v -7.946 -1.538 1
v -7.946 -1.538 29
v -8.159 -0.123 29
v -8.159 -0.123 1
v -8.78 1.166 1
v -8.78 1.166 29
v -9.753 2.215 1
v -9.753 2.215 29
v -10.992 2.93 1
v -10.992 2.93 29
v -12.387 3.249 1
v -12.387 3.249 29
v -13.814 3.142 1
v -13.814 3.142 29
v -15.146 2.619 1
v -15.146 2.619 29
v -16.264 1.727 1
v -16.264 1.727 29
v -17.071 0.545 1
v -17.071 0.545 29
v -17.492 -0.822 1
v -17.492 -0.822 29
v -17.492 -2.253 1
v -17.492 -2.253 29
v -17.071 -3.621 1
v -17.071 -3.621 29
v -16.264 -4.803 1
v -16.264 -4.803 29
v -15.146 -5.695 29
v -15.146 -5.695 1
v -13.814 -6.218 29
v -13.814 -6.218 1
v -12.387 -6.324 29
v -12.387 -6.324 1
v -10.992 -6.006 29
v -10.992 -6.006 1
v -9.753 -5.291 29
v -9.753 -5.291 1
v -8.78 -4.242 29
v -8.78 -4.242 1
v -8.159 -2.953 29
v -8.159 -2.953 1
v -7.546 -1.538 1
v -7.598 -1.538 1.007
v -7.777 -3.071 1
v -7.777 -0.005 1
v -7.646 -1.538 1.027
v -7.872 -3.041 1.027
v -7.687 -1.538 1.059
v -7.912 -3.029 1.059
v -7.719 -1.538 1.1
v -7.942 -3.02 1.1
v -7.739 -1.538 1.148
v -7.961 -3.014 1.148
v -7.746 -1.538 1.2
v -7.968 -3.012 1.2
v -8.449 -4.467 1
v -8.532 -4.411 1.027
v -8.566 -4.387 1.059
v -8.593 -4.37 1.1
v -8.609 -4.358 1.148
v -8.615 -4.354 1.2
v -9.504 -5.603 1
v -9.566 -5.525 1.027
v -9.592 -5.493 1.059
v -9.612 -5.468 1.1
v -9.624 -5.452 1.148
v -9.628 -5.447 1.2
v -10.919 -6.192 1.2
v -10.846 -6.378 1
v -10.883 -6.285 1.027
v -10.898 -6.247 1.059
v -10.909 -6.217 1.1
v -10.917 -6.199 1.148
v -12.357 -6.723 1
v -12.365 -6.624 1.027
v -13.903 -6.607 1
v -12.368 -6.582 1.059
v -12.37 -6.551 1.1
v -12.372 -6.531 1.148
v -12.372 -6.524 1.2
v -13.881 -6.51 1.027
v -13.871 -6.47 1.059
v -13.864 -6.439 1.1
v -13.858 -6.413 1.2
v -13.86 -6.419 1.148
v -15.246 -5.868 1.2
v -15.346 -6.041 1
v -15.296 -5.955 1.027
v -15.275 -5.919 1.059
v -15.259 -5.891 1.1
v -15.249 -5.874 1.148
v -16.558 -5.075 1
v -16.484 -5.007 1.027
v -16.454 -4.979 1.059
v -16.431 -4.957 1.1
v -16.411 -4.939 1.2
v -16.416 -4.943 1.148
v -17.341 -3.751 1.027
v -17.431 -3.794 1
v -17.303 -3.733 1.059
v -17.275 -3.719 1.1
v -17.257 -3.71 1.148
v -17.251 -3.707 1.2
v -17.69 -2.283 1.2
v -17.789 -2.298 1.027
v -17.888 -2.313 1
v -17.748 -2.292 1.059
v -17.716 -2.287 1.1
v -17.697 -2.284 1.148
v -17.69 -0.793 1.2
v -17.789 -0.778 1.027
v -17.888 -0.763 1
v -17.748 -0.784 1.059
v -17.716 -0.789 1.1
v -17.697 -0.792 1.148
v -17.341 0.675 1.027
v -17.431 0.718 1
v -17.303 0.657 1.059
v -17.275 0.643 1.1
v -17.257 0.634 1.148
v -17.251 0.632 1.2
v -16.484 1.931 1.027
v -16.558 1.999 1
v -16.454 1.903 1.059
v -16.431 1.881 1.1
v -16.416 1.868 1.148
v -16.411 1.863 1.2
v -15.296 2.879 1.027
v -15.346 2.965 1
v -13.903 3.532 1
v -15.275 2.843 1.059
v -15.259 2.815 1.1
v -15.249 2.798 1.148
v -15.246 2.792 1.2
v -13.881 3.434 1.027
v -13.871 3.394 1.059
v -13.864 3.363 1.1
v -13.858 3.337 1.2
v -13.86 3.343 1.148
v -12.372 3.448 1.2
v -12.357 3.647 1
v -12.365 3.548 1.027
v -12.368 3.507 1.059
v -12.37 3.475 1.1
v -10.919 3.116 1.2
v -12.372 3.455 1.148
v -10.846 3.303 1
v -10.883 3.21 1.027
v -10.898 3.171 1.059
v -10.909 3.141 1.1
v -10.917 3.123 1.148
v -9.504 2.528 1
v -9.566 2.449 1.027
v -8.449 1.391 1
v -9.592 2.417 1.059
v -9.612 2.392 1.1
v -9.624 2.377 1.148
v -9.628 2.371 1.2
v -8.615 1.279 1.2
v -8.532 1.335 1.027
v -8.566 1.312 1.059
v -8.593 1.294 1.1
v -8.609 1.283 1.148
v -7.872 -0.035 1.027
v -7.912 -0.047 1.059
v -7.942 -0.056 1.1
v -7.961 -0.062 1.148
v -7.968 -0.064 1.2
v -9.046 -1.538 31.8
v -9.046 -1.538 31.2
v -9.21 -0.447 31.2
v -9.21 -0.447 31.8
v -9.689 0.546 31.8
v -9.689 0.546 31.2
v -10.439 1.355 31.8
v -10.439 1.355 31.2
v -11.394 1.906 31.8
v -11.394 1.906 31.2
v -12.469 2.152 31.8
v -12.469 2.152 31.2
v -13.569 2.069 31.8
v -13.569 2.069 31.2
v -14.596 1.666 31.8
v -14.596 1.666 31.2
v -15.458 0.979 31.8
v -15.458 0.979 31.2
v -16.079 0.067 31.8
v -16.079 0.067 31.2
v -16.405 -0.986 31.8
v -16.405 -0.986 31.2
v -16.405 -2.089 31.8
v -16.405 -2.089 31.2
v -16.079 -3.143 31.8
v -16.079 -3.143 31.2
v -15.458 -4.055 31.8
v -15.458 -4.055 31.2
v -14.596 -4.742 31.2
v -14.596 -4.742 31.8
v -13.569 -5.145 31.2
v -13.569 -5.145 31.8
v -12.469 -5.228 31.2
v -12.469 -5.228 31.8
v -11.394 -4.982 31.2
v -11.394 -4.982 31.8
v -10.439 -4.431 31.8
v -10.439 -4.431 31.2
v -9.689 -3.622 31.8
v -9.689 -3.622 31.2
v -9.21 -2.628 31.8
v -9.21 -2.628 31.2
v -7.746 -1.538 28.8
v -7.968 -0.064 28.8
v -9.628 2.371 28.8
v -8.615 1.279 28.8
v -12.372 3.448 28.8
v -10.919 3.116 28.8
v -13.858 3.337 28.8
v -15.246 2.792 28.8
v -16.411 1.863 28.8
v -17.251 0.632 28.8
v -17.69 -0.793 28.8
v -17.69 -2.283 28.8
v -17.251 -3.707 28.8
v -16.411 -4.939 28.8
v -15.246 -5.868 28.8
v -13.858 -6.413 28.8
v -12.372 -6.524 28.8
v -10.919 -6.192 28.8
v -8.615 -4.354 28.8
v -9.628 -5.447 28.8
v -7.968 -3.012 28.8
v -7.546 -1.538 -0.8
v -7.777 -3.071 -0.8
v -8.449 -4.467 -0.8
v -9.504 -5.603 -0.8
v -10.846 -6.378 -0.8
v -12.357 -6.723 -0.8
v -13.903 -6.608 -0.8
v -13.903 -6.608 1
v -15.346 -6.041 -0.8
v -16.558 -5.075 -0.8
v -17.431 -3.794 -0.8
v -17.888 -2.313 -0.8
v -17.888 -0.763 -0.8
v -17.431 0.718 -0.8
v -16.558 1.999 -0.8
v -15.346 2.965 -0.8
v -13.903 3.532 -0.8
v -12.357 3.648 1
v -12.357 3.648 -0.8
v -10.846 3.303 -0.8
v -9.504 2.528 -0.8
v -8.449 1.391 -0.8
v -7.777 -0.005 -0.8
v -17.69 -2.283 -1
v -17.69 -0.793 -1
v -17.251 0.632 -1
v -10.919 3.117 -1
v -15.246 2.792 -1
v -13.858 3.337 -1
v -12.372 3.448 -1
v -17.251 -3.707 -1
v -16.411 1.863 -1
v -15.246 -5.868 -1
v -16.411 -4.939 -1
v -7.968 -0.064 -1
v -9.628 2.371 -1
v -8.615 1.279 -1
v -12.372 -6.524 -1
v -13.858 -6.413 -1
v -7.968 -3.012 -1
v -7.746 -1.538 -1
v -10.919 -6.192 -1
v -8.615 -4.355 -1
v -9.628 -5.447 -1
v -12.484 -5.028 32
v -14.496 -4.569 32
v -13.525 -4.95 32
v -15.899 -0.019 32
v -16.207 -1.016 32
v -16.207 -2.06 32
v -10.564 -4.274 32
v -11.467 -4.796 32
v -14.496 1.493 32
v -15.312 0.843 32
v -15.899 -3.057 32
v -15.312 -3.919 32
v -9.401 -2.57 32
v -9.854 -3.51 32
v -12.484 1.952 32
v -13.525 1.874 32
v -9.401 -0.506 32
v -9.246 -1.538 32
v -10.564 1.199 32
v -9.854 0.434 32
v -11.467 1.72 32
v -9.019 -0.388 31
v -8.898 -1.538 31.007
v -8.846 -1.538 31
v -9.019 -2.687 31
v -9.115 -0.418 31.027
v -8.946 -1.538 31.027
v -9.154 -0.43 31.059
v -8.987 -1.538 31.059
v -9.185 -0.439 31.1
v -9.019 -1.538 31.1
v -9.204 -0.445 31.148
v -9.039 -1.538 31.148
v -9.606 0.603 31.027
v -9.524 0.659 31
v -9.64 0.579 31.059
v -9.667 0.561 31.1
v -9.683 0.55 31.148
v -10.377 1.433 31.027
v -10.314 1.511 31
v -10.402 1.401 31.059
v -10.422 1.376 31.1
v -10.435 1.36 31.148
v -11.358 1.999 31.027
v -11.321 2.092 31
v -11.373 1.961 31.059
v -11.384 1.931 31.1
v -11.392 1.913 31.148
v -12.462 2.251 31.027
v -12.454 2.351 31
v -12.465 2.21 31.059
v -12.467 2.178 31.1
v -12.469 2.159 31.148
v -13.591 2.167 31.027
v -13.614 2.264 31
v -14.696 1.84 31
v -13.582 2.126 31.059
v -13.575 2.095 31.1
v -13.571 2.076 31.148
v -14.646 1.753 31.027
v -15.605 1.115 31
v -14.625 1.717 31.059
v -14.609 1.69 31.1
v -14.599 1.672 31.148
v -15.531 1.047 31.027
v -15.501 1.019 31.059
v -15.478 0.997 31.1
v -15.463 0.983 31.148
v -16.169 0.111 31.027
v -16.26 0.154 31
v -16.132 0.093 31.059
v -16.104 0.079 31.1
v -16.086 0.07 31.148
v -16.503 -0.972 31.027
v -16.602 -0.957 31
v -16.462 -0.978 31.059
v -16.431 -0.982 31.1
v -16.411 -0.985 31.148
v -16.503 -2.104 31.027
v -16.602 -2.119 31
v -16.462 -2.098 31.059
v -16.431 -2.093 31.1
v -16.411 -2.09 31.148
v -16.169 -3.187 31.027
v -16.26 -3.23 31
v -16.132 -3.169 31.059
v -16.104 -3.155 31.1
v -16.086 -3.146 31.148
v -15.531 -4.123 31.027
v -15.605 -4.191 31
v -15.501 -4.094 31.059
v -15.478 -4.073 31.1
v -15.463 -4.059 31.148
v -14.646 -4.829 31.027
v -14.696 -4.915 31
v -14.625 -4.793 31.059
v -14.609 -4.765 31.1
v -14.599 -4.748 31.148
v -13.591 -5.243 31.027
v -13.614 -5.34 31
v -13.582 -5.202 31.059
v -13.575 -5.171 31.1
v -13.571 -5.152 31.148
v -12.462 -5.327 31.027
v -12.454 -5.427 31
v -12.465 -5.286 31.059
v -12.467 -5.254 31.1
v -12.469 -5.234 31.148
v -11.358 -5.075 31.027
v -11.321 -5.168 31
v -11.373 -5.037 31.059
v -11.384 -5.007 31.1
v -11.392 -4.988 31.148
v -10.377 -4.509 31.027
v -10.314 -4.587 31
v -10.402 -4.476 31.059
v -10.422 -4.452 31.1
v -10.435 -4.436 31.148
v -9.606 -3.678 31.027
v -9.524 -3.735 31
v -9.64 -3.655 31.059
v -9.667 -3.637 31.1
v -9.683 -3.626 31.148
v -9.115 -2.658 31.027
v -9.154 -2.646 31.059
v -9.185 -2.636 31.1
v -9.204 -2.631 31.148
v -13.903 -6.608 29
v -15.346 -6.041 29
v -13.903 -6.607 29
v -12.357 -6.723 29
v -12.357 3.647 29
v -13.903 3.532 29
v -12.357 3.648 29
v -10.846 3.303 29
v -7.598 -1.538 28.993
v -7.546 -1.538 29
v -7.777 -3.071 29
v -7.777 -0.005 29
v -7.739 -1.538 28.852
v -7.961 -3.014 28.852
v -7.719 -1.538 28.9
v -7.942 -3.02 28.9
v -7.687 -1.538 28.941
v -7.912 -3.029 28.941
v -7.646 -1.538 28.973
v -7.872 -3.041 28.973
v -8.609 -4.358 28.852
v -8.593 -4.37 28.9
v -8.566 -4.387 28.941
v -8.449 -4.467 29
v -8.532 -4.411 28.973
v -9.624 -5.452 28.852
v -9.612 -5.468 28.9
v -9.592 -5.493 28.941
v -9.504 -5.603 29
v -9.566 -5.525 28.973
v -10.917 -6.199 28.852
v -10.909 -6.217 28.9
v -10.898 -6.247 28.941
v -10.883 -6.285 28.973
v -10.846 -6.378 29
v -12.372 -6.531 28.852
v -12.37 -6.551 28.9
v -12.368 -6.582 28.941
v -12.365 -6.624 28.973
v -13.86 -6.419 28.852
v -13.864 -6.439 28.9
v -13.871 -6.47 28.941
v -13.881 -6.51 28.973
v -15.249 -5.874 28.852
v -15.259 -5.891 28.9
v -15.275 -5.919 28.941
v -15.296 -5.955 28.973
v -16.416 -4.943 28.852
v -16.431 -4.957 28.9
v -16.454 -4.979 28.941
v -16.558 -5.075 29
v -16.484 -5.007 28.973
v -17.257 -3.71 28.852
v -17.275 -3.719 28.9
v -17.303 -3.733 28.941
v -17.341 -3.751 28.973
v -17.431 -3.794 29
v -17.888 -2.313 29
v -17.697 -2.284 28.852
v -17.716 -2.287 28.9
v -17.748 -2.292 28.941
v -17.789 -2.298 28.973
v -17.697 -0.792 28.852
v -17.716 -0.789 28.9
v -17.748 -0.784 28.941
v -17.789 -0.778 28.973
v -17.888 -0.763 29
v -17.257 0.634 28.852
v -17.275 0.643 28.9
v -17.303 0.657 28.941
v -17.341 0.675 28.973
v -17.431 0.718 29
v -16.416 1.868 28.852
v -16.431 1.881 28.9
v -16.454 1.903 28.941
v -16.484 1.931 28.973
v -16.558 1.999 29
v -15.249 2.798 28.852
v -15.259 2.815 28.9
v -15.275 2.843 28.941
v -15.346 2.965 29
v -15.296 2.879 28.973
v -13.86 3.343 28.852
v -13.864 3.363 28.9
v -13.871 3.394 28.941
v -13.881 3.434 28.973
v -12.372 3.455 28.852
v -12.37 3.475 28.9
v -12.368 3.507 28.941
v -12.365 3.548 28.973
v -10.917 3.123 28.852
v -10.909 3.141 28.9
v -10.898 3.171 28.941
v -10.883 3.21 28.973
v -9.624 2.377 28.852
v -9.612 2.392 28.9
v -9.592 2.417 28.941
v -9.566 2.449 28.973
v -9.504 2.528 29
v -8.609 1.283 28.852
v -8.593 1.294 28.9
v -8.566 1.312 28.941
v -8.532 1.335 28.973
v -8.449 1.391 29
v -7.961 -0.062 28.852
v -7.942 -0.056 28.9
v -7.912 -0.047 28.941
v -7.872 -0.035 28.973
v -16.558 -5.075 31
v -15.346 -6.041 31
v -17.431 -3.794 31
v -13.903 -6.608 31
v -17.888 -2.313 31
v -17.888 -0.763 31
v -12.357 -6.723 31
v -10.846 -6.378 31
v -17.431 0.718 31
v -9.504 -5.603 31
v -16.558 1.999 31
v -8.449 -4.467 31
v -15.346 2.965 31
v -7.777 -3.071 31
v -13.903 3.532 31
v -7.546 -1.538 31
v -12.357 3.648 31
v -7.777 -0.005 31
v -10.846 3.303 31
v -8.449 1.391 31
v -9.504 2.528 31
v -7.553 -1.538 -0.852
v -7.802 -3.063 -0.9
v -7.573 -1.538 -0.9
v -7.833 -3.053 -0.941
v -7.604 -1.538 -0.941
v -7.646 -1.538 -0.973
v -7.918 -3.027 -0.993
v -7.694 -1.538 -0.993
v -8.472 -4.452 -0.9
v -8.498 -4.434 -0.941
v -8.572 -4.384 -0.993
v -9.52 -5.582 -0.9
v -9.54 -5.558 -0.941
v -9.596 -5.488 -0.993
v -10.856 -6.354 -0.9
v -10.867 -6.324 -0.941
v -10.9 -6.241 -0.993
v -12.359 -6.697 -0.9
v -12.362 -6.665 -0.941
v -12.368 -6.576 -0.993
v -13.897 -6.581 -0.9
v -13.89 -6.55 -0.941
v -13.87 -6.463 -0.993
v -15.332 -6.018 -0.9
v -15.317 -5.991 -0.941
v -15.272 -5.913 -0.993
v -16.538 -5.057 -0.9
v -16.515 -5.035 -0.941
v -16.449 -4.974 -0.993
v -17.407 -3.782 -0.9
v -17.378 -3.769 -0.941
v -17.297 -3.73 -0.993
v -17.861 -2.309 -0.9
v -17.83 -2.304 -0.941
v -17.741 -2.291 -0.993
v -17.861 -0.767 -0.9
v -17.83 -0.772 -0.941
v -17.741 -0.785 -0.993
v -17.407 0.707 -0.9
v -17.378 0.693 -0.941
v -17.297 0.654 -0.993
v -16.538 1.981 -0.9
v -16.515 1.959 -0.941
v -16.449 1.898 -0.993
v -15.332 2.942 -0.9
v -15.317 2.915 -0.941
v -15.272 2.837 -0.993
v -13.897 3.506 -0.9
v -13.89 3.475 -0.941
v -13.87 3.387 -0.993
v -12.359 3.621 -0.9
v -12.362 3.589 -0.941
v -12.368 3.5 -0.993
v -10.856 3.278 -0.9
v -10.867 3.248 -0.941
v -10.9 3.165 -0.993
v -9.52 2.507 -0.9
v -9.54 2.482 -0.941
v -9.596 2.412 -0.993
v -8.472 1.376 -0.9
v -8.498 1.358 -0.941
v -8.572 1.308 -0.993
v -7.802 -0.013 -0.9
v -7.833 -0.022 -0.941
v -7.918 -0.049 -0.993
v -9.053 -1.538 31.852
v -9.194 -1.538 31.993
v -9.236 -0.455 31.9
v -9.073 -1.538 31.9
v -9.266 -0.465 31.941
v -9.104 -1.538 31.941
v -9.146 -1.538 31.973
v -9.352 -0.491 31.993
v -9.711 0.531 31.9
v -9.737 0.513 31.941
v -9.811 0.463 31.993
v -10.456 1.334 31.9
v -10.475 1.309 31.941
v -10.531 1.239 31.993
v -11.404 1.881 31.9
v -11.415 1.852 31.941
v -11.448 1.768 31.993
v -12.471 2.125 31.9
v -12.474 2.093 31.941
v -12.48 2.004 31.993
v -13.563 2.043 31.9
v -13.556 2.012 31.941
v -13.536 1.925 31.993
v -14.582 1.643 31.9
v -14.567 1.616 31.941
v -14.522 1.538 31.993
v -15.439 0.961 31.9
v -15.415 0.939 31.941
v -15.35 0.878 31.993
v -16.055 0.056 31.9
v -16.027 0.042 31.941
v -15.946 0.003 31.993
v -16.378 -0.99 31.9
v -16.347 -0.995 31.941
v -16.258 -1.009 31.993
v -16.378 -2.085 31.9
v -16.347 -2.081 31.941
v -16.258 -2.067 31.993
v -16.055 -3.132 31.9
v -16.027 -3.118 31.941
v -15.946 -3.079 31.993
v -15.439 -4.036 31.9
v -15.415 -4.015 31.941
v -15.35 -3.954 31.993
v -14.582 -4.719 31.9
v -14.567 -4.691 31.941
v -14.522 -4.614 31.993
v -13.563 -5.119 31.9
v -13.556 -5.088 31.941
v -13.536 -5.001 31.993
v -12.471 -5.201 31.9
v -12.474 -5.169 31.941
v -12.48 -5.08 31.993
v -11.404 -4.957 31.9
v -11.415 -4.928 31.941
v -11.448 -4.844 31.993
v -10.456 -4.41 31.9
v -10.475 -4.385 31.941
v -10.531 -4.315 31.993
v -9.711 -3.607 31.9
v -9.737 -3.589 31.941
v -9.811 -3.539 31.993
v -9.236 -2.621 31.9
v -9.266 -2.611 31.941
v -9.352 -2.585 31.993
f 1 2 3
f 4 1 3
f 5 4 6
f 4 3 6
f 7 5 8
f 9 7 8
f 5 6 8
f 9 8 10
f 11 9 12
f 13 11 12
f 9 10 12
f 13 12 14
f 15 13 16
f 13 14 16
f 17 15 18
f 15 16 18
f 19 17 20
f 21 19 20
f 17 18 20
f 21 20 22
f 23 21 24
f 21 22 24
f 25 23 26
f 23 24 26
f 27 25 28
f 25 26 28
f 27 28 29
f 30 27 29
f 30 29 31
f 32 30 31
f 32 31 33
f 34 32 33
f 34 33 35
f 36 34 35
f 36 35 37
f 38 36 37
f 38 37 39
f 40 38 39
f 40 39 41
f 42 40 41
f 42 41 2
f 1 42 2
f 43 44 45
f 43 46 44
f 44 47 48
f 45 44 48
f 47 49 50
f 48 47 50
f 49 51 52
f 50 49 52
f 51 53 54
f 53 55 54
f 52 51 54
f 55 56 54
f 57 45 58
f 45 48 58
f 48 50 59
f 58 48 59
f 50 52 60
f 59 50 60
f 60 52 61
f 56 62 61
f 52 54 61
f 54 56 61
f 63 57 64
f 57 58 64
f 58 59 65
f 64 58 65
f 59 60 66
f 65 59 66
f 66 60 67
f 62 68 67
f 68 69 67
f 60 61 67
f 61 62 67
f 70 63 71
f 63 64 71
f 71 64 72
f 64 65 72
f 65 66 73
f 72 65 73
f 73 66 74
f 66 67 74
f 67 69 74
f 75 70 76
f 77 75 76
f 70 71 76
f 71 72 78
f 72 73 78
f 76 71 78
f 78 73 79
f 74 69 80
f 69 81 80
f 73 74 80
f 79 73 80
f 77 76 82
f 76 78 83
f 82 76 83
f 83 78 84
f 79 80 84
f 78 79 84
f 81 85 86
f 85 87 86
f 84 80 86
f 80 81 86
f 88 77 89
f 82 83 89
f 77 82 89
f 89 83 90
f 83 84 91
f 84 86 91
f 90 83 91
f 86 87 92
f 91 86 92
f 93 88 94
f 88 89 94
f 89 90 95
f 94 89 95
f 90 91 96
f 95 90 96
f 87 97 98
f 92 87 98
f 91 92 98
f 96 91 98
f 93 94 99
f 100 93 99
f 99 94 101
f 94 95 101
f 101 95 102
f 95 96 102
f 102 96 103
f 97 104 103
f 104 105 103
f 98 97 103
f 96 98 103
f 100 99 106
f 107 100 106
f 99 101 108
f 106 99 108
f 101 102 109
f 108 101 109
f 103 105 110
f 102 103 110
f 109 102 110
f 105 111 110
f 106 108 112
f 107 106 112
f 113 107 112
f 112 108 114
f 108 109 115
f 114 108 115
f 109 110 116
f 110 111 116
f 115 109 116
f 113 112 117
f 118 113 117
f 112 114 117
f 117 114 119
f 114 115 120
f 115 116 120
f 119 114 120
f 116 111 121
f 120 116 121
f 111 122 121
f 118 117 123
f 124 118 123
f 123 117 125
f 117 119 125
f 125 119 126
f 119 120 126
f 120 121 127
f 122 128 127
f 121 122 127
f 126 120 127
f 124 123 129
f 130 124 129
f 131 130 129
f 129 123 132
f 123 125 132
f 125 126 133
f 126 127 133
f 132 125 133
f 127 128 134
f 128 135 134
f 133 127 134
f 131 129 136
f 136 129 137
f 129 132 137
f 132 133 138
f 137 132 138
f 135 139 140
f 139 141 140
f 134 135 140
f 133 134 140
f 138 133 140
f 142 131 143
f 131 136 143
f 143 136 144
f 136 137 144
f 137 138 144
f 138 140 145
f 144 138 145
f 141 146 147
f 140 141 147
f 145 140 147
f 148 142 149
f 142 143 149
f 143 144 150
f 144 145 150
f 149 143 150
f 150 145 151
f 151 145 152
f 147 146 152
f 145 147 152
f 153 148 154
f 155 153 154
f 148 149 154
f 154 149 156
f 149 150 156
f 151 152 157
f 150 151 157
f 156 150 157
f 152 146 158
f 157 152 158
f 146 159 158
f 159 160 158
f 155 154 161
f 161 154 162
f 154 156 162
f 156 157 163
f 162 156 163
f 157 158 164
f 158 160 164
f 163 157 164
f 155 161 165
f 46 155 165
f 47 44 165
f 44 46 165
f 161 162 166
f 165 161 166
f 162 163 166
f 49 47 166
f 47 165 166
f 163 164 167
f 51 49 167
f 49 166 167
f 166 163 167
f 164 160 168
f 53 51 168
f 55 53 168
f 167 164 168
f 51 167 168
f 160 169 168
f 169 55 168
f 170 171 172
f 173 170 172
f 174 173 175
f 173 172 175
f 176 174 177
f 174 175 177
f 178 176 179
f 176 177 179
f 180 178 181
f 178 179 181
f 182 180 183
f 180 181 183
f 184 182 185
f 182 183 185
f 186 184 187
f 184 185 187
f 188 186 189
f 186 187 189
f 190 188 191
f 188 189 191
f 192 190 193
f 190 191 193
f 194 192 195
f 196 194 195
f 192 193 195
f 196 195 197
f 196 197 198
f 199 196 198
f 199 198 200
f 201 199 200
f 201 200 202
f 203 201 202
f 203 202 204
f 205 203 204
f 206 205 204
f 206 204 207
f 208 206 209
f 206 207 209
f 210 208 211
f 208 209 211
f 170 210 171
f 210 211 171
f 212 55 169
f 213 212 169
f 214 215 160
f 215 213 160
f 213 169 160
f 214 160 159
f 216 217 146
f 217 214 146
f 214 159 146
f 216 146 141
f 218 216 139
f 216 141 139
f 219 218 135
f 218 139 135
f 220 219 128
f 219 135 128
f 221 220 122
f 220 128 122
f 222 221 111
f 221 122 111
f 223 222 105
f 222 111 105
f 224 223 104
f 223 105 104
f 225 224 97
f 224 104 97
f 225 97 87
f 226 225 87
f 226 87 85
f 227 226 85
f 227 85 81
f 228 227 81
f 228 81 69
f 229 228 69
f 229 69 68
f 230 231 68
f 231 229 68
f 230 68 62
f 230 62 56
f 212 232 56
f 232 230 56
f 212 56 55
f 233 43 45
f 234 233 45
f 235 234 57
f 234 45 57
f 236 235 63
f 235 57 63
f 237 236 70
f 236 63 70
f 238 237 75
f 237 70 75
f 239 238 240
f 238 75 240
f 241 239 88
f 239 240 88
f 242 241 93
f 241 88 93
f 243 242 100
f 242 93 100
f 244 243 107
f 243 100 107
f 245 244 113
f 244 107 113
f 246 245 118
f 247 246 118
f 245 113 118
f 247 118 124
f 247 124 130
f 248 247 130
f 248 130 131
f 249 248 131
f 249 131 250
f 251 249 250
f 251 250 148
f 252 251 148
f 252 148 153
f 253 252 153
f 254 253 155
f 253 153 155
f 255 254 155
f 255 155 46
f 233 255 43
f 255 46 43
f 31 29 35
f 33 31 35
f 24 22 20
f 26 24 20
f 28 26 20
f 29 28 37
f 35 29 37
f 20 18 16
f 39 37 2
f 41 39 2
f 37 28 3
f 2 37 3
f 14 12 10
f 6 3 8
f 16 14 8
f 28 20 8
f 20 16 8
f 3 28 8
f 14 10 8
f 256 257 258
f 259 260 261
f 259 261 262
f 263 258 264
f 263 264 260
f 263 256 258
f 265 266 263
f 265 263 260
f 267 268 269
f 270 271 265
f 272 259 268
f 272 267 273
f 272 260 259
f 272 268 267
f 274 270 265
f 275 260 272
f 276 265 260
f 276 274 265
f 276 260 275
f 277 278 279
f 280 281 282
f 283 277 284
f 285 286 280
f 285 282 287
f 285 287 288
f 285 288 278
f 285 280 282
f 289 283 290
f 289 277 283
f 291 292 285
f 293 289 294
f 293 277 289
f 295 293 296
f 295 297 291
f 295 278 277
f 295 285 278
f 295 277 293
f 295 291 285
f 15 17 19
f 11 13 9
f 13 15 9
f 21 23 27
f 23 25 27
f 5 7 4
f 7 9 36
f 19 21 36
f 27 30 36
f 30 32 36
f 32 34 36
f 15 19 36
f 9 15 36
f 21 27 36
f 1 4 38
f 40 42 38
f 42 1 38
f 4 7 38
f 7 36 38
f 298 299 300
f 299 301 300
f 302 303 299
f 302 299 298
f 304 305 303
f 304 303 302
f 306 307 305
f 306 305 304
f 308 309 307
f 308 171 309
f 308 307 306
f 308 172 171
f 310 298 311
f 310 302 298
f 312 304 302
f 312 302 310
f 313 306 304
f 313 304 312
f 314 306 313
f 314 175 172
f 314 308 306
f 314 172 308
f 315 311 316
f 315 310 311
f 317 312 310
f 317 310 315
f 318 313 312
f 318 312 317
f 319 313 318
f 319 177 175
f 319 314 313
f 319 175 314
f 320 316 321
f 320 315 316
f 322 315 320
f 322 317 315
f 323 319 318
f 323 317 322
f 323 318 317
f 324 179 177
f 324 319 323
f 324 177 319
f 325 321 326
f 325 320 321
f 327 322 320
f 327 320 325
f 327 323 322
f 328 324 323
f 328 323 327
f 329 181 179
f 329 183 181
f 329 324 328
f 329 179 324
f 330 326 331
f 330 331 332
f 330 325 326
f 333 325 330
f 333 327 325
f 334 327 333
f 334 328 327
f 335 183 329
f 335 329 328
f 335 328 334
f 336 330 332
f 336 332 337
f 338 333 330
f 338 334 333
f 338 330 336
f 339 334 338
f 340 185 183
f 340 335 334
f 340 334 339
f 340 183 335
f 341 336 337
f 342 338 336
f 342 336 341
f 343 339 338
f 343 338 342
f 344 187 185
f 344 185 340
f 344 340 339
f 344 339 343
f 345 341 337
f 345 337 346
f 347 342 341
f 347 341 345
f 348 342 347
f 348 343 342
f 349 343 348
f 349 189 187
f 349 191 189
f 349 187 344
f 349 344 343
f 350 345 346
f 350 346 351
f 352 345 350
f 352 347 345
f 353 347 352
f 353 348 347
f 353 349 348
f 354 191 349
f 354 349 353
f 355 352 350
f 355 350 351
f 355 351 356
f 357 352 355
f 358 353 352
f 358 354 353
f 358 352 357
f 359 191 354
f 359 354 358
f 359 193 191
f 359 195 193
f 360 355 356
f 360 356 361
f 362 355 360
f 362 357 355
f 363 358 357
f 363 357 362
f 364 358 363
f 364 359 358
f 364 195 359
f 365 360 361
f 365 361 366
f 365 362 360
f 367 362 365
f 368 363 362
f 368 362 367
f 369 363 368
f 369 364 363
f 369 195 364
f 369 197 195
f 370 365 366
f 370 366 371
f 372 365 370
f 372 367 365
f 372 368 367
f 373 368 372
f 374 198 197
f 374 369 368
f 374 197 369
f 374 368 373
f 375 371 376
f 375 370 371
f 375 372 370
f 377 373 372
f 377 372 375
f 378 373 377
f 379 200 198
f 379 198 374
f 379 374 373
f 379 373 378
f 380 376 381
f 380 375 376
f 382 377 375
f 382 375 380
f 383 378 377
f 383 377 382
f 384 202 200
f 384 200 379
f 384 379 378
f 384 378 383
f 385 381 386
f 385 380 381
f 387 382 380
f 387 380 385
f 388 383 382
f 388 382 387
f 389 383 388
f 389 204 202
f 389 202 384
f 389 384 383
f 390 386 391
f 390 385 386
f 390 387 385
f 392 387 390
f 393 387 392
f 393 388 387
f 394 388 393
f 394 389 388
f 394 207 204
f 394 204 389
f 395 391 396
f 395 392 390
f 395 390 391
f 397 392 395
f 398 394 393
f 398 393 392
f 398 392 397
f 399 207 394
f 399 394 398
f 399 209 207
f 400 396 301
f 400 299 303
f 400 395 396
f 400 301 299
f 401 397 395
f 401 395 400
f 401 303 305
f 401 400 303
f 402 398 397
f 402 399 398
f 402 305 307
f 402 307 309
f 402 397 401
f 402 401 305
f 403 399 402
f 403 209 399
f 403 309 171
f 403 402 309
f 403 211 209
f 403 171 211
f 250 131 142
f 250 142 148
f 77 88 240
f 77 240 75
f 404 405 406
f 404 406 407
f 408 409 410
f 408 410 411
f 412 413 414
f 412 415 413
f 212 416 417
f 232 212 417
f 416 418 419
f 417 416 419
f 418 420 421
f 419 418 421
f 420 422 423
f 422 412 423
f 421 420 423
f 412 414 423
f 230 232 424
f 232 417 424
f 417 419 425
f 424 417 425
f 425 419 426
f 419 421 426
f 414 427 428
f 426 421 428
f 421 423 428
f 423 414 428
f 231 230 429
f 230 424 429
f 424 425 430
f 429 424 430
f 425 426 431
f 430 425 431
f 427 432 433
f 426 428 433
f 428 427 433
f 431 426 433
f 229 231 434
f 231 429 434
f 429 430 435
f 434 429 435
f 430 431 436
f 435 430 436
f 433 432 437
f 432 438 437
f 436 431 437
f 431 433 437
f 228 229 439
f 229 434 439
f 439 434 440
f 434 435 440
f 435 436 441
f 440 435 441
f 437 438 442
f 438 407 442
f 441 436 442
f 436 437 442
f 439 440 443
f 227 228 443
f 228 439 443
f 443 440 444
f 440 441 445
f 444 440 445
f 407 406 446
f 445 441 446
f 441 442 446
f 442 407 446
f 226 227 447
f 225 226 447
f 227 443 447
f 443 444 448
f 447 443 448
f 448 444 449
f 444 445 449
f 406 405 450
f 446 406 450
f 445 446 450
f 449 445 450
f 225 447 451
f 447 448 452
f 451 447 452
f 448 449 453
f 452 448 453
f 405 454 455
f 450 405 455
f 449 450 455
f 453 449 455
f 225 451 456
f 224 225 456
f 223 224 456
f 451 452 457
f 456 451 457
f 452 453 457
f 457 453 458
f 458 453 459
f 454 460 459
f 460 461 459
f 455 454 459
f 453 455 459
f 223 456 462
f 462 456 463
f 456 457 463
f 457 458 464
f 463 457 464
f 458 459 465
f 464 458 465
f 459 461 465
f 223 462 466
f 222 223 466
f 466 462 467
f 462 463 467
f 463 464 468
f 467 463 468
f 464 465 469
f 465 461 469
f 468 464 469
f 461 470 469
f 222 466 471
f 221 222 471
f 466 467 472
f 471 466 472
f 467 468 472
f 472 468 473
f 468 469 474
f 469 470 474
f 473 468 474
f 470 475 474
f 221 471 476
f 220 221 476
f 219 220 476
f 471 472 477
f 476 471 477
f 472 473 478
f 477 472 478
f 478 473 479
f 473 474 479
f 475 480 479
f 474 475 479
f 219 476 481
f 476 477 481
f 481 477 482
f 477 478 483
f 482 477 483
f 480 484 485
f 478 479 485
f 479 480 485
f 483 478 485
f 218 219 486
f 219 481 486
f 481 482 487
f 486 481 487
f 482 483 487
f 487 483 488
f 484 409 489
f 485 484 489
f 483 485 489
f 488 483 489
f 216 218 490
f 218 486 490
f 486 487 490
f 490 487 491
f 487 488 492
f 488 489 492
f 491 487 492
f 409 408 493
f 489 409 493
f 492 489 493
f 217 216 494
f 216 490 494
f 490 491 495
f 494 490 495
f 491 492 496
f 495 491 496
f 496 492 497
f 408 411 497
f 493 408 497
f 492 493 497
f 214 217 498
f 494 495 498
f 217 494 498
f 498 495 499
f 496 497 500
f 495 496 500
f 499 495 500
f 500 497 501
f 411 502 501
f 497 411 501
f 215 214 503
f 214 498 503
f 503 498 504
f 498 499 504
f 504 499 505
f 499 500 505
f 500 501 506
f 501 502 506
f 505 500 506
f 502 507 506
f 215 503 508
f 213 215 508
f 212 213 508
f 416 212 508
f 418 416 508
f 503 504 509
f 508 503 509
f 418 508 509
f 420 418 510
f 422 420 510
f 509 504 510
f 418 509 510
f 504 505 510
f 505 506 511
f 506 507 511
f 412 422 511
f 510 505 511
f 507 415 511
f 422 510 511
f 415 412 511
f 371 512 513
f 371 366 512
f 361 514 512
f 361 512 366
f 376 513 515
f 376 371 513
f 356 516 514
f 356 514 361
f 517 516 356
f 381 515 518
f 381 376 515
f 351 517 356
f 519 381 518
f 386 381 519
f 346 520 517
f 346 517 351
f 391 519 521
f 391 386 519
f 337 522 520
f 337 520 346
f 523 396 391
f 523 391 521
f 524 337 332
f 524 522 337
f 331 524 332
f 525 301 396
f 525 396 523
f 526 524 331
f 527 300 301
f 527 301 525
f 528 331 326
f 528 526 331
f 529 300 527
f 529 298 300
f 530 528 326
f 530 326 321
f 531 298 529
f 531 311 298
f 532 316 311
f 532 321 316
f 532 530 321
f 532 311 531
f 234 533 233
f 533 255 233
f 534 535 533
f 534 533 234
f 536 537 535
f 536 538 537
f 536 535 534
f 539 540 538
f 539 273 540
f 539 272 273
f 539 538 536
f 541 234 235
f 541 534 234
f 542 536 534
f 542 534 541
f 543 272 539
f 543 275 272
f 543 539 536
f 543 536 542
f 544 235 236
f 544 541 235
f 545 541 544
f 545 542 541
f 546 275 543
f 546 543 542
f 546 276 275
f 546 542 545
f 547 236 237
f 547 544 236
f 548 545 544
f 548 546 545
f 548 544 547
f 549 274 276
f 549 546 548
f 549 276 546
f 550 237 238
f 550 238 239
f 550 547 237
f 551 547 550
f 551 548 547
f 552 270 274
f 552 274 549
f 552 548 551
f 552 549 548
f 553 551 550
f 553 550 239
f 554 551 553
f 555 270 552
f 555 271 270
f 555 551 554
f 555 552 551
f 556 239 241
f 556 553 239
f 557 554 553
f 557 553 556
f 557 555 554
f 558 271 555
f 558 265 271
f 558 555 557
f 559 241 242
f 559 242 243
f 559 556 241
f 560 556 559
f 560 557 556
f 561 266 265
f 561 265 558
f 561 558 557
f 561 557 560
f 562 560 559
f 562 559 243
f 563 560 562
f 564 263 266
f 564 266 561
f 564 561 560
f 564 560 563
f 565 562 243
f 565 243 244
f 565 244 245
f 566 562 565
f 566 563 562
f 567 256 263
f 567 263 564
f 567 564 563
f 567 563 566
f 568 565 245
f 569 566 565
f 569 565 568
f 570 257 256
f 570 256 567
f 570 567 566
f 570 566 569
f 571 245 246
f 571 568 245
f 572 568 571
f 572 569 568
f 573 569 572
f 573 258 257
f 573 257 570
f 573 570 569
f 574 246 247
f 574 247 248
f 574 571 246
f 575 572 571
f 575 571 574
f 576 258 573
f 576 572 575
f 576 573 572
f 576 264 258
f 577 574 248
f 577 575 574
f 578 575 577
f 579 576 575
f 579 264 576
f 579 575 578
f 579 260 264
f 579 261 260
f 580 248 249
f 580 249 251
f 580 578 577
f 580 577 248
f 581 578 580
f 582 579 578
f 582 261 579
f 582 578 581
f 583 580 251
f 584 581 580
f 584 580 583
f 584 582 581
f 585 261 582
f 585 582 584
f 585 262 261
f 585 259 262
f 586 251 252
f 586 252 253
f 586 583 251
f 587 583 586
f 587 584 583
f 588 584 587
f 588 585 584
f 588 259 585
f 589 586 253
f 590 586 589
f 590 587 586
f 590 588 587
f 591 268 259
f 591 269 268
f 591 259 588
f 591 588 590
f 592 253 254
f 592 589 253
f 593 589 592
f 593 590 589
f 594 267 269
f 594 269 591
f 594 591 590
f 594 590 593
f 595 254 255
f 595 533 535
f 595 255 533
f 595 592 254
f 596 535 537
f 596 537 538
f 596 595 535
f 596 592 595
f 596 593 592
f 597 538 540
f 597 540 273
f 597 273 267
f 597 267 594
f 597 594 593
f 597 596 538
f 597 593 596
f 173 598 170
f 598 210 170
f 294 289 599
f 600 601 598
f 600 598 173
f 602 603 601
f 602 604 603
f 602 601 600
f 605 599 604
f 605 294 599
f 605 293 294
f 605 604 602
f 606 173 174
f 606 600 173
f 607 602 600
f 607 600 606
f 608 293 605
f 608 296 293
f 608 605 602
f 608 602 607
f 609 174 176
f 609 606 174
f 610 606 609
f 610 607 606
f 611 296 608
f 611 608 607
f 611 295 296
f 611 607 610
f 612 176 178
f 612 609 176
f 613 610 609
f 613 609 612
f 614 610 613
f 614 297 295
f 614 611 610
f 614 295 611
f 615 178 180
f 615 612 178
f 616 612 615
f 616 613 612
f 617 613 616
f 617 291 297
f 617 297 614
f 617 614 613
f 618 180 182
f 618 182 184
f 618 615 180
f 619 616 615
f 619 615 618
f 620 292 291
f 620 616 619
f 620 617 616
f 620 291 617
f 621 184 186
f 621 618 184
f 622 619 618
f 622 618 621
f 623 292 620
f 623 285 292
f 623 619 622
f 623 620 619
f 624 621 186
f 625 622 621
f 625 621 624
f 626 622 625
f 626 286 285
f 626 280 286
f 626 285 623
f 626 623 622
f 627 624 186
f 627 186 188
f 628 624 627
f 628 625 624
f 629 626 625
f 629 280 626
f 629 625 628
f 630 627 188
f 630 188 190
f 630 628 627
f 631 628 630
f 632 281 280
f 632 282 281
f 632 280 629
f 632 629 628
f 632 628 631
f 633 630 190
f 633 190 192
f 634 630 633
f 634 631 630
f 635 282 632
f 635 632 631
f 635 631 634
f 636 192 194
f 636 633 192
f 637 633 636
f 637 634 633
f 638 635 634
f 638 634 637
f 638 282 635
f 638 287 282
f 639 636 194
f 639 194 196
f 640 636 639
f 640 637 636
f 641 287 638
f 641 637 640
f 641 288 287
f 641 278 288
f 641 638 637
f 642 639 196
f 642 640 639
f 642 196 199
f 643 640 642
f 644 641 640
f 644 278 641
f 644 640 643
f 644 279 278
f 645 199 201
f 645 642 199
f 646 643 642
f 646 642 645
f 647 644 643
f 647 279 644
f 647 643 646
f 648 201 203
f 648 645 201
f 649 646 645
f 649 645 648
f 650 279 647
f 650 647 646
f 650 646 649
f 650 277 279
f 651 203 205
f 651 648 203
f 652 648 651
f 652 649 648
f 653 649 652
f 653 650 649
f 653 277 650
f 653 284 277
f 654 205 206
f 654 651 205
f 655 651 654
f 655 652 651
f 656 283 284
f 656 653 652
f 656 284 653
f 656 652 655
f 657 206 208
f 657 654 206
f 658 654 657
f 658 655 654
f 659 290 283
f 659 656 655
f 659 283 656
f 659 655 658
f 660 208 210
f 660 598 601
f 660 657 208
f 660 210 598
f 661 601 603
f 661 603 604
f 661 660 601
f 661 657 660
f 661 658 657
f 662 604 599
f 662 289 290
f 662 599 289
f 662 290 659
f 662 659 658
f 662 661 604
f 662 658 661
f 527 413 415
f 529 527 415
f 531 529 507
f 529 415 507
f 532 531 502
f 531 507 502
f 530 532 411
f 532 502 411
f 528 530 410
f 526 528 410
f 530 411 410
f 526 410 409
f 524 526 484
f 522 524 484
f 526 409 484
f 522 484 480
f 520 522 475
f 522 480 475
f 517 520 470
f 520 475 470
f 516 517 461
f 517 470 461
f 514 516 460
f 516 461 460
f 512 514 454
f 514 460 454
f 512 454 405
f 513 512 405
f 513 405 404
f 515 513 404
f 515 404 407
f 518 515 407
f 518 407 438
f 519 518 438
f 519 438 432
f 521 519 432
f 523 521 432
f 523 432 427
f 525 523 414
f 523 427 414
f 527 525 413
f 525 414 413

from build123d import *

# Parameters (mm, degrees)
ESBO_O1_R                     = 5
RESSALTO_EXTRUS_O1_DEPTH      = 30
ESBO_O2_R                     = 4.8
CORTE_EXTRUS_O1_DEPTH         = 30
RESSALTO_EXTRUS_O2_DEPTH      = 1
RESSALTO_EXTRUS_O2_DEPTH_BACK = 1
ESBO_O3_R                     = 5.2
ESBO_O4_R                     = 3.7
RESSALTO_EXTRUS_O3_DEPTH      = 1
RESSALTO_EXTRUS_O6_DEPTH      = 1
RESSALTO_EXTRUS_O6_DEPTH_BACK = 1
ESBO_O7_R                     = 5.2
FILETE1_R                     = 0.2


with BuildPart() as part:
    # Esboço1 → Ressalto-extrusão1 (new body)
    with BuildSketch(Plane.XY):
        with Locations((-12.745849563, -1.537898167)):
            Circle(ESBO_O1_R)
    extrude(amount=RESSALTO_EXTRUS_O1_DEPTH)

    # Esboço2 → Corte-extrusão1 (cut)
    with BuildSketch(Plane.XY.offset(30)):
        with Locations((-12.745849563, -1.537898167)):
            Circle(ESBO_O2_R)
    extrude(amount=-CORTE_EXTRUS_O1_DEPTH, mode=Mode.SUBTRACT)

    # Esboço3 → Ressalto-extrusão2 (add, two sides: drawn at the far end of the back side and taken through both)
    with BuildSketch(Plane.XY.offset(30).offset(-RESSALTO_EXTRUS_O2_DEPTH_BACK)):
        with Locations((-12.745849563, -1.537898167)):
            Circle(ESBO_O3_R)
    extrude(amount=RESSALTO_EXTRUS_O2_DEPTH + RESSALTO_EXTRUS_O2_DEPTH_BACK)

    # Esboço4 → Ressalto-extrusão3 (add)
    with BuildSketch(Plane.XY.offset(31)):
        with Locations((-12.745849563, -1.537898167)):
            Circle(ESBO_O4_R)
    extrude(amount=RESSALTO_EXTRUS_O3_DEPTH)

    # Esboço7 → Ressalto-extrusão6 (add, two sides: drawn at the far end of the back side and taken through both)
    with BuildSketch(Plane(origin=(0, 0, 0), x_dir=(-1, 0, 0), z_dir=(0, 0, -1)).offset(-RESSALTO_EXTRUS_O6_DEPTH_BACK)):
        with Locations(Location((12.745849563, -1.537898167, 0), (0, 0, 180))):
            Circle(ESBO_O7_R)
    extrude(amount=RESSALTO_EXTRUS_O6_DEPTH + RESSALTO_EXTRUS_O6_DEPTH_BACK)

    # Filete1
    filete1_edges = [part.edges().sort_by_distance(p)[0] for p in [
        (-17.745849563, -1.537898167, 29),
        (-16.445849563, -1.537898167, 31),
        (-16.445849563, -1.537898167, 32),
        (-17.745849563, -1.537898167, 1),
        (-17.945849563, -1.537898167, -1),
    ]]
    fillet(filete1_edges, radius=FILETE1_R - 0.0001)  # a hair under: the kernel refuses the full size


solid = part.part
